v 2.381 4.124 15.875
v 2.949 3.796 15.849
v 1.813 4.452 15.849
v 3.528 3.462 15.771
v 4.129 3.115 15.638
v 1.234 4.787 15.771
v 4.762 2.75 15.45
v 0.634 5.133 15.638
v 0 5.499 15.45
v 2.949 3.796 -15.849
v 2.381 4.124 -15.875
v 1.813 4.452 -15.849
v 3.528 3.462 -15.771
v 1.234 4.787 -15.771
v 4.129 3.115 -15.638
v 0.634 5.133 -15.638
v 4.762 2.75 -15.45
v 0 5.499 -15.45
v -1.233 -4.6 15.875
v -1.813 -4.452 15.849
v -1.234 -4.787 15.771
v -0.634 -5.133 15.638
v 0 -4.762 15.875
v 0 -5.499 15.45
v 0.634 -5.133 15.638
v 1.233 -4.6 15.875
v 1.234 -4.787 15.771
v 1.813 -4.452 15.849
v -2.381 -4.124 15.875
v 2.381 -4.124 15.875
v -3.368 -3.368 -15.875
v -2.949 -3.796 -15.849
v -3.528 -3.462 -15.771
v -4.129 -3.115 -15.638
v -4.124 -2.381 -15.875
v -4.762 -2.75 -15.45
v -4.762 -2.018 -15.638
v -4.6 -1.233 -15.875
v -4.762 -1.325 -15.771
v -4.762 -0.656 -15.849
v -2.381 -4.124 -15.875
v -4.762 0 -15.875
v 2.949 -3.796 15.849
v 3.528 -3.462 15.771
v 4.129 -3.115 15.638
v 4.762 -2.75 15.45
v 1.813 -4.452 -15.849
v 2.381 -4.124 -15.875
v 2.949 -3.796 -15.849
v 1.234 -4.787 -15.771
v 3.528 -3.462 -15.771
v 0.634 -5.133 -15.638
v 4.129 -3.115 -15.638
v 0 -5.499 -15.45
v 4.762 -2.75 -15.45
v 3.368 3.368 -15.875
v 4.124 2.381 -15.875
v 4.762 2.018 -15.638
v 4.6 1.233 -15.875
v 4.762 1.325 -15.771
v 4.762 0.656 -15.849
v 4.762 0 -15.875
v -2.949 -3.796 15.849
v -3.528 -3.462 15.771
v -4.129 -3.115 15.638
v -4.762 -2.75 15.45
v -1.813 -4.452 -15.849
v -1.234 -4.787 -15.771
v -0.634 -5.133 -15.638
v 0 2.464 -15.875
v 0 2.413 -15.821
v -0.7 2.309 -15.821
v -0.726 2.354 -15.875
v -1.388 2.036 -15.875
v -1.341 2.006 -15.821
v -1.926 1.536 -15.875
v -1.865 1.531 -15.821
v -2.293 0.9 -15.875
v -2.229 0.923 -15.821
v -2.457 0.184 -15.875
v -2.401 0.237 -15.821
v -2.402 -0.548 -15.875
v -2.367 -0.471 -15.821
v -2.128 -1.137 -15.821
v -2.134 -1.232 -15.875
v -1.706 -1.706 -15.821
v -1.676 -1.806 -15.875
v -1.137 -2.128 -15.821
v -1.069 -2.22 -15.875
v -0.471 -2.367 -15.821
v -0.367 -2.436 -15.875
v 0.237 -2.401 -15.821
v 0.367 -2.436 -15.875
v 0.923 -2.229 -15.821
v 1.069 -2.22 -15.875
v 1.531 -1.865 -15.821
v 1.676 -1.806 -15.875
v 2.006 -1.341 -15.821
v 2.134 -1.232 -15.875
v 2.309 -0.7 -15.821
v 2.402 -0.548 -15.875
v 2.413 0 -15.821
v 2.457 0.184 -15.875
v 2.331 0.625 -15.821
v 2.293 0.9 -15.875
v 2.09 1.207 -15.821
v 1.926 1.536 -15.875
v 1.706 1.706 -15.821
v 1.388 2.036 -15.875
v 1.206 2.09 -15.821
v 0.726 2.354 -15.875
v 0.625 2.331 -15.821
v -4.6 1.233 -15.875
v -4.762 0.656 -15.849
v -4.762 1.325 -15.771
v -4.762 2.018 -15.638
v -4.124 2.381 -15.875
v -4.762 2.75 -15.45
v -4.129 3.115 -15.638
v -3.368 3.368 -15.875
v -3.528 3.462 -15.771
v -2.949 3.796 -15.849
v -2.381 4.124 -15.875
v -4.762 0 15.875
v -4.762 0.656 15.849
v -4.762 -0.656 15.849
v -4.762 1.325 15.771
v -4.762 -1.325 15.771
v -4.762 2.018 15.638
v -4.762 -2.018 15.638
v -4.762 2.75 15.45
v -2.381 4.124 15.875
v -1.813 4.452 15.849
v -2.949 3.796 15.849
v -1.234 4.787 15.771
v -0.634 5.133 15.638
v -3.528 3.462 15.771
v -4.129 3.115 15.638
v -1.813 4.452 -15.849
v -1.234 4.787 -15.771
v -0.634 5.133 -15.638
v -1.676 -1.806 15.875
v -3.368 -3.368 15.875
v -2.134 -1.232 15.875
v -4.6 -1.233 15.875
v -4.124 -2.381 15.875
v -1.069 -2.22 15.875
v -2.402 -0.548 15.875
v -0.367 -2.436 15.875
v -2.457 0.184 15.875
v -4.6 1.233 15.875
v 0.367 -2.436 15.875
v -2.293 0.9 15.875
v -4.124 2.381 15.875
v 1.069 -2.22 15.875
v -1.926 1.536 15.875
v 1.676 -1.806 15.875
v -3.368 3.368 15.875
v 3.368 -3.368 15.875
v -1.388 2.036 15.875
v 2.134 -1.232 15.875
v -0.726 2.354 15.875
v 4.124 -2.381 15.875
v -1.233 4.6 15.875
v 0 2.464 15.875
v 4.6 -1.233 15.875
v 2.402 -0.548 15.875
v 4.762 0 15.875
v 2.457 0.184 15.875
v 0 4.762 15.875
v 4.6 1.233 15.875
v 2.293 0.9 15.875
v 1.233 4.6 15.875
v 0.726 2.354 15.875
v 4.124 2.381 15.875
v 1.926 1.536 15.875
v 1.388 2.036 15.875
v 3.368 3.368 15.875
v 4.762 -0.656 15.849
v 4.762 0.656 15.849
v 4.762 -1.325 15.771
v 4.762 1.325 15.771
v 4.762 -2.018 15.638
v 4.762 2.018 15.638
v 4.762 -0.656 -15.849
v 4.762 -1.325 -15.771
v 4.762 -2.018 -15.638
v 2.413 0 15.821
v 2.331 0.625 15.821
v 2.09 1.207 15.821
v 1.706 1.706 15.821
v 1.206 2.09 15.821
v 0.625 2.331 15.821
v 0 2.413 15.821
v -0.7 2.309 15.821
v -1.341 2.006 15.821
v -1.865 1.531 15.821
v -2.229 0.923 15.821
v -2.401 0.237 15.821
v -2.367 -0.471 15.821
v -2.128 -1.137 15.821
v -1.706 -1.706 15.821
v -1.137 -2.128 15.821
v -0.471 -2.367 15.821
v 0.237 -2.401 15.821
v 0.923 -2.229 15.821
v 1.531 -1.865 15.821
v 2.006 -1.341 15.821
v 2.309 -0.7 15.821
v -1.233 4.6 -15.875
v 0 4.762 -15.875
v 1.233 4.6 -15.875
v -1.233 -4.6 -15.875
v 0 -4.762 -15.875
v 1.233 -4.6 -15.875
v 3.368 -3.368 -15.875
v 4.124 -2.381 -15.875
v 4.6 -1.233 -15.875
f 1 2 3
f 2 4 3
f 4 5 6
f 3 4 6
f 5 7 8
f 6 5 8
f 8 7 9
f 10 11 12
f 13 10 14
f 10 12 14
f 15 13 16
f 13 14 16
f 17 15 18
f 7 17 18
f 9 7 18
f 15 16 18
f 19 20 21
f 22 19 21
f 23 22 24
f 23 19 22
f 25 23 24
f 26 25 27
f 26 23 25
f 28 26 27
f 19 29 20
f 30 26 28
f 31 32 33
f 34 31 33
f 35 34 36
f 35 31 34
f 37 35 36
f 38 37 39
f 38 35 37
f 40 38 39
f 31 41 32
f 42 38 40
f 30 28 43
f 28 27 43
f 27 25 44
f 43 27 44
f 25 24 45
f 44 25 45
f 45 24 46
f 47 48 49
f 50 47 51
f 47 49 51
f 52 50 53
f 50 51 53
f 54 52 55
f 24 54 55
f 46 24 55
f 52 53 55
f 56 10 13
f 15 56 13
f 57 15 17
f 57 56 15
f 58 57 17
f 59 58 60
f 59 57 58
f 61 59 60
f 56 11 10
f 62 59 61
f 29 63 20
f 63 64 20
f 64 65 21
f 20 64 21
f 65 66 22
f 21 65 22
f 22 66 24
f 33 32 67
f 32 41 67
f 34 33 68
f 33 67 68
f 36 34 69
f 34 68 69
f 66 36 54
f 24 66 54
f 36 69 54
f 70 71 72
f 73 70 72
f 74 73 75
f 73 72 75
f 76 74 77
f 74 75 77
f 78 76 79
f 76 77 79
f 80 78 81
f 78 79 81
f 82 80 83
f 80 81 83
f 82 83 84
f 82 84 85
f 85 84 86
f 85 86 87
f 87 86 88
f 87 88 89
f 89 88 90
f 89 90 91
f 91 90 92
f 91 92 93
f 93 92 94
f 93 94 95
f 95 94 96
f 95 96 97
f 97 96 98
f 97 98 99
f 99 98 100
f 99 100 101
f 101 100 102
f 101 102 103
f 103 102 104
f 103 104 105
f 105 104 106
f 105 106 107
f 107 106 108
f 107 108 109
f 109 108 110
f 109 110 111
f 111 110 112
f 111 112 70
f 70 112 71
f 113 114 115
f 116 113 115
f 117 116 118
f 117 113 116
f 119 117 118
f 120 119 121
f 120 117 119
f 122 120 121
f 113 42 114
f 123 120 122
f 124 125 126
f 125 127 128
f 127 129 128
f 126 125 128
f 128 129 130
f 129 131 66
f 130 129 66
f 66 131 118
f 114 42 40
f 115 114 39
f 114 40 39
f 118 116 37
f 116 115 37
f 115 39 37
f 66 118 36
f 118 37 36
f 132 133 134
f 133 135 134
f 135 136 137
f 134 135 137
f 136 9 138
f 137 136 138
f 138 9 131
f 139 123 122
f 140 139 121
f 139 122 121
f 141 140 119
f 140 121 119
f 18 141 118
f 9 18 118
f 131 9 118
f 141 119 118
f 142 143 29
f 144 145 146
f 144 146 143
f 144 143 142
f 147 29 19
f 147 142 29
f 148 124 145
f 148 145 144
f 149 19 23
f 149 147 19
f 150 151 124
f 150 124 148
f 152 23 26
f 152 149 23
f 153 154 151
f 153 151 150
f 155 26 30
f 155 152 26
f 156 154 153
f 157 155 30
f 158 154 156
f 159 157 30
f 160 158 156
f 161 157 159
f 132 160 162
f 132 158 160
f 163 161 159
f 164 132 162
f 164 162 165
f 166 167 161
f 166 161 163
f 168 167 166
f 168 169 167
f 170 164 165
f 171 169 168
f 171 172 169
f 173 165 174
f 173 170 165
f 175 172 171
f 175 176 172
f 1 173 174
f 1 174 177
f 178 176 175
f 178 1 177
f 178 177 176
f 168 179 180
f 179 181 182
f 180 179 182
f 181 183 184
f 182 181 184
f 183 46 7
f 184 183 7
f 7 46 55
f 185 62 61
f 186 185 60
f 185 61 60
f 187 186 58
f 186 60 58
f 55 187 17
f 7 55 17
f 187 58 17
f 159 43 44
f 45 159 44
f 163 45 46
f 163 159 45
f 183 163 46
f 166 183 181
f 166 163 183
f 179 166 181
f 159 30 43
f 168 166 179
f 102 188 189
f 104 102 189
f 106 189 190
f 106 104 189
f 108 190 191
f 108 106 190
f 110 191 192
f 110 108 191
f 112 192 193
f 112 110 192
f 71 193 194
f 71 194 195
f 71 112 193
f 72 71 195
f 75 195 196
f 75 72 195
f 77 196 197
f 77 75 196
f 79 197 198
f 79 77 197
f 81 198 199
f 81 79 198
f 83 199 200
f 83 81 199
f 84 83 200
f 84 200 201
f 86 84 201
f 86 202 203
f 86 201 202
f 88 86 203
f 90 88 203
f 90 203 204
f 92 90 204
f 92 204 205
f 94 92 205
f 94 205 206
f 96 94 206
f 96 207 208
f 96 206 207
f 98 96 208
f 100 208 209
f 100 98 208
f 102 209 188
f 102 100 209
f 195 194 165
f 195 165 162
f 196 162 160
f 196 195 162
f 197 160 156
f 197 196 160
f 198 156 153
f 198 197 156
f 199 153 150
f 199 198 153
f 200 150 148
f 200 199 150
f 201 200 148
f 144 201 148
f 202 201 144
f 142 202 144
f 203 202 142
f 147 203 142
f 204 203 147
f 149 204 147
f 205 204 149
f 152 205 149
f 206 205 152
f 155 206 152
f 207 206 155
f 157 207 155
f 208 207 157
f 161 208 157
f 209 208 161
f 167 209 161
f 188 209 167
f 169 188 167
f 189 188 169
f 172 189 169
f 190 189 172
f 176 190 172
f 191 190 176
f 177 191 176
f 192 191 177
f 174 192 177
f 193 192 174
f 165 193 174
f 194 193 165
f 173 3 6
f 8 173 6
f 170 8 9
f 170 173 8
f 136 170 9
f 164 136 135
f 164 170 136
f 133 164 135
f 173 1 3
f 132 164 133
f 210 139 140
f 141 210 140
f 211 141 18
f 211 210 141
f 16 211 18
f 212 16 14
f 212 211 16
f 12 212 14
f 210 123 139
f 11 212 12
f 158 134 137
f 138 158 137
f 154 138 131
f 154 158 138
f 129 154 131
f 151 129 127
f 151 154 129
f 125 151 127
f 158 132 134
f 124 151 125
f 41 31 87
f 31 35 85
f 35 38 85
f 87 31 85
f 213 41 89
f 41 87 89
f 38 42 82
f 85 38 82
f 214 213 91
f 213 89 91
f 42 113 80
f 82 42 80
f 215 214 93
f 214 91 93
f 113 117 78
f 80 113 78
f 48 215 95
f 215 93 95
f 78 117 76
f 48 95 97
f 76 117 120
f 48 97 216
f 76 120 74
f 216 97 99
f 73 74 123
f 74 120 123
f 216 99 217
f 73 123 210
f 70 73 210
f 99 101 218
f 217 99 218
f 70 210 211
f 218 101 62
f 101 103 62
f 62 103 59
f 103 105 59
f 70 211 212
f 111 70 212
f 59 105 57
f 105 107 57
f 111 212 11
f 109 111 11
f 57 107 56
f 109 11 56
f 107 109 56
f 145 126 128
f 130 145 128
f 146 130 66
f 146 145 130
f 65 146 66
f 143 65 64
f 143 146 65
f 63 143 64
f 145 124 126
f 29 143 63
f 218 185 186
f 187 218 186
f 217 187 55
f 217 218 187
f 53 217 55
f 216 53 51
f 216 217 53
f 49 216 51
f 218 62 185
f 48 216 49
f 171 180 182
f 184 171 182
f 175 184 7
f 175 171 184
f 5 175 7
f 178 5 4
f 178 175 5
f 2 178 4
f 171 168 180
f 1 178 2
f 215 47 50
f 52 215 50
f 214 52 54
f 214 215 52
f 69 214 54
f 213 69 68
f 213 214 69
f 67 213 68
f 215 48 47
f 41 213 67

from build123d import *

# Parameters (mm, degrees)
EXTRUDE1_DEPTH          = 15.875
EXTRUDE1_DEPTH_BACK     = 15.875
SKETCH1_R               = 2.413
SKETCH8_OUTSIDE_W       = 134.808
SKETCH8_OUTSIDE_H       = 136.282
SKETCH8_OUTSIDE_R       = 4.7625
EXTRUDE4_DEPTH          = 33.572776689
EXTRUDE4_DRAFT          = -60
MIRROR1_COPY_1_SKETCH_W = 134.808
MIRROR1_COPY_1_SKETCH_H = 136.282
MIRROR1_COPY_1_SKETCH_R = 4.7625
MIRROR1_COPY_1_DEPTH    = 33.572776689
MIRROR1_COPY_1_DRAFT    = -60


with BuildPart() as part:
    # Sketch1 → Extrude1 (new, two sides: drawn at the far end of the back side and taken through both)
    with BuildSketch(Plane.XY.offset(-EXTRUDE1_DEPTH_BACK)):
        Polygon((0, 5.499261314), (-4.7625, 2.749630657), (-4.7625, -2.749630657), (0, -5.499261314), (4.7625, -2.749630657), (4.7625, 2.749630657), align=None)
        Circle(SKETCH1_R, mode=Mode.SUBTRACT)
    extrude(amount=EXTRUDE1_DEPTH + EXTRUDE1_DEPTH_BACK)

    # Extrude3 cone 1 section (through the dimple's axis) → Extrude3 (revolve, cut)
    with BuildSketch(Plane(origin=(0, 0, -15.875), x_dir=(0, 1, 0), z_dir=(1, 0, 0))):
        Polygon((0, 0), (2.4638, 0), (0, 2.642102028), align=None)
    extrude3 = revolve(axis=Axis((0, 0, -15.875), (0, 0, 1)), mode=Mode.SUBTRACT)


with BuildPart() as extrude4_tool:
    # Sketch8 outside → Extrude4 (with draft: the straight prism first)
    with BuildSketch(Plane(origin=(0, 0, -15.875), x_dir=(-1, 0, 0), z_dir=(0, 0, -1))):
        Rectangle(SKETCH8_OUTSIDE_W, SKETCH8_OUTSIDE_H)
        Circle(SKETCH8_OUTSIDE_R, mode=Mode.SUBTRACT)
    extrude(amount=-EXTRUDE4_DEPTH)
    # Extrude4: the draft: its side faces are tilted about the plane it starts from
    extrude4_sides = [extrude4_tool.faces().sort_by_distance(p)[0] for p in [
        (0, -68.141, 0.911388345),
        (-67.404, 0, 0.911388345),
        (0, 68.141, 0.911388345),
        (67.404, 0, 0.911388345),
        (4.7625, 0, 0.911388345),
    ]]
    draft(extrude4_sides, Plane(origin=(0, 0, -15.875), x_dir=(-1, 0, 0), z_dir=(0, 0, -1)), EXTRUDE4_DRAFT)


with BuildPart() as part_1:
    add(part.part)

    # Extrude4: cut by extrude4_tool
    add(extrude4_tool.part, mode=Mode.SUBTRACT)

    # Mirror1: Extrude3 across plane
    add(extrude3.mirror(Plane.XY), mode=Mode.SUBTRACT)


with BuildPart() as mirror1_copy_1_tool:
    # Mirror1 copy 1 sketch → Mirror1 copy 1 (with draft: the straight prism first)
    with BuildSketch(Plane(origin=(0, 0, 15.875), x_dir=(-1, 0, 0), z_dir=(0, 0, 1))):
        Rectangle(MIRROR1_COPY_1_SKETCH_W, MIRROR1_COPY_1_SKETCH_H)
        Circle(MIRROR1_COPY_1_SKETCH_R, mode=Mode.SUBTRACT)
    extrude(amount=-MIRROR1_COPY_1_DEPTH)
    # Mirror1 copy 1: the draft: its side faces are tilted about the plane it starts from
    mirror1_copy_1_sides = [mirror1_copy_1_tool.faces().sort_by_distance(p)[0] for p in [
        (0, -68.141, -0.911388345),
        (-67.404, 0, -0.911388345),
        (0, 68.141, -0.911388345),
        (67.404, 0, -0.911388345),
        (4.7625, 0, -0.911388345),
    ]]
    draft(mirror1_copy_1_sides, Plane(origin=(0, 0, 15.875), x_dir=(-1, 0, 0), z_dir=(0, 0, 1)), MIRROR1_COPY_1_DRAFT)


with BuildPart() as part_2:
    add(part_1.part)

    # Mirror1 copy 1: cut by mirror1_copy_1_tool
    add(mirror1_copy_1_tool.part, mode=Mode.SUBTRACT)


solid = part_2.part
